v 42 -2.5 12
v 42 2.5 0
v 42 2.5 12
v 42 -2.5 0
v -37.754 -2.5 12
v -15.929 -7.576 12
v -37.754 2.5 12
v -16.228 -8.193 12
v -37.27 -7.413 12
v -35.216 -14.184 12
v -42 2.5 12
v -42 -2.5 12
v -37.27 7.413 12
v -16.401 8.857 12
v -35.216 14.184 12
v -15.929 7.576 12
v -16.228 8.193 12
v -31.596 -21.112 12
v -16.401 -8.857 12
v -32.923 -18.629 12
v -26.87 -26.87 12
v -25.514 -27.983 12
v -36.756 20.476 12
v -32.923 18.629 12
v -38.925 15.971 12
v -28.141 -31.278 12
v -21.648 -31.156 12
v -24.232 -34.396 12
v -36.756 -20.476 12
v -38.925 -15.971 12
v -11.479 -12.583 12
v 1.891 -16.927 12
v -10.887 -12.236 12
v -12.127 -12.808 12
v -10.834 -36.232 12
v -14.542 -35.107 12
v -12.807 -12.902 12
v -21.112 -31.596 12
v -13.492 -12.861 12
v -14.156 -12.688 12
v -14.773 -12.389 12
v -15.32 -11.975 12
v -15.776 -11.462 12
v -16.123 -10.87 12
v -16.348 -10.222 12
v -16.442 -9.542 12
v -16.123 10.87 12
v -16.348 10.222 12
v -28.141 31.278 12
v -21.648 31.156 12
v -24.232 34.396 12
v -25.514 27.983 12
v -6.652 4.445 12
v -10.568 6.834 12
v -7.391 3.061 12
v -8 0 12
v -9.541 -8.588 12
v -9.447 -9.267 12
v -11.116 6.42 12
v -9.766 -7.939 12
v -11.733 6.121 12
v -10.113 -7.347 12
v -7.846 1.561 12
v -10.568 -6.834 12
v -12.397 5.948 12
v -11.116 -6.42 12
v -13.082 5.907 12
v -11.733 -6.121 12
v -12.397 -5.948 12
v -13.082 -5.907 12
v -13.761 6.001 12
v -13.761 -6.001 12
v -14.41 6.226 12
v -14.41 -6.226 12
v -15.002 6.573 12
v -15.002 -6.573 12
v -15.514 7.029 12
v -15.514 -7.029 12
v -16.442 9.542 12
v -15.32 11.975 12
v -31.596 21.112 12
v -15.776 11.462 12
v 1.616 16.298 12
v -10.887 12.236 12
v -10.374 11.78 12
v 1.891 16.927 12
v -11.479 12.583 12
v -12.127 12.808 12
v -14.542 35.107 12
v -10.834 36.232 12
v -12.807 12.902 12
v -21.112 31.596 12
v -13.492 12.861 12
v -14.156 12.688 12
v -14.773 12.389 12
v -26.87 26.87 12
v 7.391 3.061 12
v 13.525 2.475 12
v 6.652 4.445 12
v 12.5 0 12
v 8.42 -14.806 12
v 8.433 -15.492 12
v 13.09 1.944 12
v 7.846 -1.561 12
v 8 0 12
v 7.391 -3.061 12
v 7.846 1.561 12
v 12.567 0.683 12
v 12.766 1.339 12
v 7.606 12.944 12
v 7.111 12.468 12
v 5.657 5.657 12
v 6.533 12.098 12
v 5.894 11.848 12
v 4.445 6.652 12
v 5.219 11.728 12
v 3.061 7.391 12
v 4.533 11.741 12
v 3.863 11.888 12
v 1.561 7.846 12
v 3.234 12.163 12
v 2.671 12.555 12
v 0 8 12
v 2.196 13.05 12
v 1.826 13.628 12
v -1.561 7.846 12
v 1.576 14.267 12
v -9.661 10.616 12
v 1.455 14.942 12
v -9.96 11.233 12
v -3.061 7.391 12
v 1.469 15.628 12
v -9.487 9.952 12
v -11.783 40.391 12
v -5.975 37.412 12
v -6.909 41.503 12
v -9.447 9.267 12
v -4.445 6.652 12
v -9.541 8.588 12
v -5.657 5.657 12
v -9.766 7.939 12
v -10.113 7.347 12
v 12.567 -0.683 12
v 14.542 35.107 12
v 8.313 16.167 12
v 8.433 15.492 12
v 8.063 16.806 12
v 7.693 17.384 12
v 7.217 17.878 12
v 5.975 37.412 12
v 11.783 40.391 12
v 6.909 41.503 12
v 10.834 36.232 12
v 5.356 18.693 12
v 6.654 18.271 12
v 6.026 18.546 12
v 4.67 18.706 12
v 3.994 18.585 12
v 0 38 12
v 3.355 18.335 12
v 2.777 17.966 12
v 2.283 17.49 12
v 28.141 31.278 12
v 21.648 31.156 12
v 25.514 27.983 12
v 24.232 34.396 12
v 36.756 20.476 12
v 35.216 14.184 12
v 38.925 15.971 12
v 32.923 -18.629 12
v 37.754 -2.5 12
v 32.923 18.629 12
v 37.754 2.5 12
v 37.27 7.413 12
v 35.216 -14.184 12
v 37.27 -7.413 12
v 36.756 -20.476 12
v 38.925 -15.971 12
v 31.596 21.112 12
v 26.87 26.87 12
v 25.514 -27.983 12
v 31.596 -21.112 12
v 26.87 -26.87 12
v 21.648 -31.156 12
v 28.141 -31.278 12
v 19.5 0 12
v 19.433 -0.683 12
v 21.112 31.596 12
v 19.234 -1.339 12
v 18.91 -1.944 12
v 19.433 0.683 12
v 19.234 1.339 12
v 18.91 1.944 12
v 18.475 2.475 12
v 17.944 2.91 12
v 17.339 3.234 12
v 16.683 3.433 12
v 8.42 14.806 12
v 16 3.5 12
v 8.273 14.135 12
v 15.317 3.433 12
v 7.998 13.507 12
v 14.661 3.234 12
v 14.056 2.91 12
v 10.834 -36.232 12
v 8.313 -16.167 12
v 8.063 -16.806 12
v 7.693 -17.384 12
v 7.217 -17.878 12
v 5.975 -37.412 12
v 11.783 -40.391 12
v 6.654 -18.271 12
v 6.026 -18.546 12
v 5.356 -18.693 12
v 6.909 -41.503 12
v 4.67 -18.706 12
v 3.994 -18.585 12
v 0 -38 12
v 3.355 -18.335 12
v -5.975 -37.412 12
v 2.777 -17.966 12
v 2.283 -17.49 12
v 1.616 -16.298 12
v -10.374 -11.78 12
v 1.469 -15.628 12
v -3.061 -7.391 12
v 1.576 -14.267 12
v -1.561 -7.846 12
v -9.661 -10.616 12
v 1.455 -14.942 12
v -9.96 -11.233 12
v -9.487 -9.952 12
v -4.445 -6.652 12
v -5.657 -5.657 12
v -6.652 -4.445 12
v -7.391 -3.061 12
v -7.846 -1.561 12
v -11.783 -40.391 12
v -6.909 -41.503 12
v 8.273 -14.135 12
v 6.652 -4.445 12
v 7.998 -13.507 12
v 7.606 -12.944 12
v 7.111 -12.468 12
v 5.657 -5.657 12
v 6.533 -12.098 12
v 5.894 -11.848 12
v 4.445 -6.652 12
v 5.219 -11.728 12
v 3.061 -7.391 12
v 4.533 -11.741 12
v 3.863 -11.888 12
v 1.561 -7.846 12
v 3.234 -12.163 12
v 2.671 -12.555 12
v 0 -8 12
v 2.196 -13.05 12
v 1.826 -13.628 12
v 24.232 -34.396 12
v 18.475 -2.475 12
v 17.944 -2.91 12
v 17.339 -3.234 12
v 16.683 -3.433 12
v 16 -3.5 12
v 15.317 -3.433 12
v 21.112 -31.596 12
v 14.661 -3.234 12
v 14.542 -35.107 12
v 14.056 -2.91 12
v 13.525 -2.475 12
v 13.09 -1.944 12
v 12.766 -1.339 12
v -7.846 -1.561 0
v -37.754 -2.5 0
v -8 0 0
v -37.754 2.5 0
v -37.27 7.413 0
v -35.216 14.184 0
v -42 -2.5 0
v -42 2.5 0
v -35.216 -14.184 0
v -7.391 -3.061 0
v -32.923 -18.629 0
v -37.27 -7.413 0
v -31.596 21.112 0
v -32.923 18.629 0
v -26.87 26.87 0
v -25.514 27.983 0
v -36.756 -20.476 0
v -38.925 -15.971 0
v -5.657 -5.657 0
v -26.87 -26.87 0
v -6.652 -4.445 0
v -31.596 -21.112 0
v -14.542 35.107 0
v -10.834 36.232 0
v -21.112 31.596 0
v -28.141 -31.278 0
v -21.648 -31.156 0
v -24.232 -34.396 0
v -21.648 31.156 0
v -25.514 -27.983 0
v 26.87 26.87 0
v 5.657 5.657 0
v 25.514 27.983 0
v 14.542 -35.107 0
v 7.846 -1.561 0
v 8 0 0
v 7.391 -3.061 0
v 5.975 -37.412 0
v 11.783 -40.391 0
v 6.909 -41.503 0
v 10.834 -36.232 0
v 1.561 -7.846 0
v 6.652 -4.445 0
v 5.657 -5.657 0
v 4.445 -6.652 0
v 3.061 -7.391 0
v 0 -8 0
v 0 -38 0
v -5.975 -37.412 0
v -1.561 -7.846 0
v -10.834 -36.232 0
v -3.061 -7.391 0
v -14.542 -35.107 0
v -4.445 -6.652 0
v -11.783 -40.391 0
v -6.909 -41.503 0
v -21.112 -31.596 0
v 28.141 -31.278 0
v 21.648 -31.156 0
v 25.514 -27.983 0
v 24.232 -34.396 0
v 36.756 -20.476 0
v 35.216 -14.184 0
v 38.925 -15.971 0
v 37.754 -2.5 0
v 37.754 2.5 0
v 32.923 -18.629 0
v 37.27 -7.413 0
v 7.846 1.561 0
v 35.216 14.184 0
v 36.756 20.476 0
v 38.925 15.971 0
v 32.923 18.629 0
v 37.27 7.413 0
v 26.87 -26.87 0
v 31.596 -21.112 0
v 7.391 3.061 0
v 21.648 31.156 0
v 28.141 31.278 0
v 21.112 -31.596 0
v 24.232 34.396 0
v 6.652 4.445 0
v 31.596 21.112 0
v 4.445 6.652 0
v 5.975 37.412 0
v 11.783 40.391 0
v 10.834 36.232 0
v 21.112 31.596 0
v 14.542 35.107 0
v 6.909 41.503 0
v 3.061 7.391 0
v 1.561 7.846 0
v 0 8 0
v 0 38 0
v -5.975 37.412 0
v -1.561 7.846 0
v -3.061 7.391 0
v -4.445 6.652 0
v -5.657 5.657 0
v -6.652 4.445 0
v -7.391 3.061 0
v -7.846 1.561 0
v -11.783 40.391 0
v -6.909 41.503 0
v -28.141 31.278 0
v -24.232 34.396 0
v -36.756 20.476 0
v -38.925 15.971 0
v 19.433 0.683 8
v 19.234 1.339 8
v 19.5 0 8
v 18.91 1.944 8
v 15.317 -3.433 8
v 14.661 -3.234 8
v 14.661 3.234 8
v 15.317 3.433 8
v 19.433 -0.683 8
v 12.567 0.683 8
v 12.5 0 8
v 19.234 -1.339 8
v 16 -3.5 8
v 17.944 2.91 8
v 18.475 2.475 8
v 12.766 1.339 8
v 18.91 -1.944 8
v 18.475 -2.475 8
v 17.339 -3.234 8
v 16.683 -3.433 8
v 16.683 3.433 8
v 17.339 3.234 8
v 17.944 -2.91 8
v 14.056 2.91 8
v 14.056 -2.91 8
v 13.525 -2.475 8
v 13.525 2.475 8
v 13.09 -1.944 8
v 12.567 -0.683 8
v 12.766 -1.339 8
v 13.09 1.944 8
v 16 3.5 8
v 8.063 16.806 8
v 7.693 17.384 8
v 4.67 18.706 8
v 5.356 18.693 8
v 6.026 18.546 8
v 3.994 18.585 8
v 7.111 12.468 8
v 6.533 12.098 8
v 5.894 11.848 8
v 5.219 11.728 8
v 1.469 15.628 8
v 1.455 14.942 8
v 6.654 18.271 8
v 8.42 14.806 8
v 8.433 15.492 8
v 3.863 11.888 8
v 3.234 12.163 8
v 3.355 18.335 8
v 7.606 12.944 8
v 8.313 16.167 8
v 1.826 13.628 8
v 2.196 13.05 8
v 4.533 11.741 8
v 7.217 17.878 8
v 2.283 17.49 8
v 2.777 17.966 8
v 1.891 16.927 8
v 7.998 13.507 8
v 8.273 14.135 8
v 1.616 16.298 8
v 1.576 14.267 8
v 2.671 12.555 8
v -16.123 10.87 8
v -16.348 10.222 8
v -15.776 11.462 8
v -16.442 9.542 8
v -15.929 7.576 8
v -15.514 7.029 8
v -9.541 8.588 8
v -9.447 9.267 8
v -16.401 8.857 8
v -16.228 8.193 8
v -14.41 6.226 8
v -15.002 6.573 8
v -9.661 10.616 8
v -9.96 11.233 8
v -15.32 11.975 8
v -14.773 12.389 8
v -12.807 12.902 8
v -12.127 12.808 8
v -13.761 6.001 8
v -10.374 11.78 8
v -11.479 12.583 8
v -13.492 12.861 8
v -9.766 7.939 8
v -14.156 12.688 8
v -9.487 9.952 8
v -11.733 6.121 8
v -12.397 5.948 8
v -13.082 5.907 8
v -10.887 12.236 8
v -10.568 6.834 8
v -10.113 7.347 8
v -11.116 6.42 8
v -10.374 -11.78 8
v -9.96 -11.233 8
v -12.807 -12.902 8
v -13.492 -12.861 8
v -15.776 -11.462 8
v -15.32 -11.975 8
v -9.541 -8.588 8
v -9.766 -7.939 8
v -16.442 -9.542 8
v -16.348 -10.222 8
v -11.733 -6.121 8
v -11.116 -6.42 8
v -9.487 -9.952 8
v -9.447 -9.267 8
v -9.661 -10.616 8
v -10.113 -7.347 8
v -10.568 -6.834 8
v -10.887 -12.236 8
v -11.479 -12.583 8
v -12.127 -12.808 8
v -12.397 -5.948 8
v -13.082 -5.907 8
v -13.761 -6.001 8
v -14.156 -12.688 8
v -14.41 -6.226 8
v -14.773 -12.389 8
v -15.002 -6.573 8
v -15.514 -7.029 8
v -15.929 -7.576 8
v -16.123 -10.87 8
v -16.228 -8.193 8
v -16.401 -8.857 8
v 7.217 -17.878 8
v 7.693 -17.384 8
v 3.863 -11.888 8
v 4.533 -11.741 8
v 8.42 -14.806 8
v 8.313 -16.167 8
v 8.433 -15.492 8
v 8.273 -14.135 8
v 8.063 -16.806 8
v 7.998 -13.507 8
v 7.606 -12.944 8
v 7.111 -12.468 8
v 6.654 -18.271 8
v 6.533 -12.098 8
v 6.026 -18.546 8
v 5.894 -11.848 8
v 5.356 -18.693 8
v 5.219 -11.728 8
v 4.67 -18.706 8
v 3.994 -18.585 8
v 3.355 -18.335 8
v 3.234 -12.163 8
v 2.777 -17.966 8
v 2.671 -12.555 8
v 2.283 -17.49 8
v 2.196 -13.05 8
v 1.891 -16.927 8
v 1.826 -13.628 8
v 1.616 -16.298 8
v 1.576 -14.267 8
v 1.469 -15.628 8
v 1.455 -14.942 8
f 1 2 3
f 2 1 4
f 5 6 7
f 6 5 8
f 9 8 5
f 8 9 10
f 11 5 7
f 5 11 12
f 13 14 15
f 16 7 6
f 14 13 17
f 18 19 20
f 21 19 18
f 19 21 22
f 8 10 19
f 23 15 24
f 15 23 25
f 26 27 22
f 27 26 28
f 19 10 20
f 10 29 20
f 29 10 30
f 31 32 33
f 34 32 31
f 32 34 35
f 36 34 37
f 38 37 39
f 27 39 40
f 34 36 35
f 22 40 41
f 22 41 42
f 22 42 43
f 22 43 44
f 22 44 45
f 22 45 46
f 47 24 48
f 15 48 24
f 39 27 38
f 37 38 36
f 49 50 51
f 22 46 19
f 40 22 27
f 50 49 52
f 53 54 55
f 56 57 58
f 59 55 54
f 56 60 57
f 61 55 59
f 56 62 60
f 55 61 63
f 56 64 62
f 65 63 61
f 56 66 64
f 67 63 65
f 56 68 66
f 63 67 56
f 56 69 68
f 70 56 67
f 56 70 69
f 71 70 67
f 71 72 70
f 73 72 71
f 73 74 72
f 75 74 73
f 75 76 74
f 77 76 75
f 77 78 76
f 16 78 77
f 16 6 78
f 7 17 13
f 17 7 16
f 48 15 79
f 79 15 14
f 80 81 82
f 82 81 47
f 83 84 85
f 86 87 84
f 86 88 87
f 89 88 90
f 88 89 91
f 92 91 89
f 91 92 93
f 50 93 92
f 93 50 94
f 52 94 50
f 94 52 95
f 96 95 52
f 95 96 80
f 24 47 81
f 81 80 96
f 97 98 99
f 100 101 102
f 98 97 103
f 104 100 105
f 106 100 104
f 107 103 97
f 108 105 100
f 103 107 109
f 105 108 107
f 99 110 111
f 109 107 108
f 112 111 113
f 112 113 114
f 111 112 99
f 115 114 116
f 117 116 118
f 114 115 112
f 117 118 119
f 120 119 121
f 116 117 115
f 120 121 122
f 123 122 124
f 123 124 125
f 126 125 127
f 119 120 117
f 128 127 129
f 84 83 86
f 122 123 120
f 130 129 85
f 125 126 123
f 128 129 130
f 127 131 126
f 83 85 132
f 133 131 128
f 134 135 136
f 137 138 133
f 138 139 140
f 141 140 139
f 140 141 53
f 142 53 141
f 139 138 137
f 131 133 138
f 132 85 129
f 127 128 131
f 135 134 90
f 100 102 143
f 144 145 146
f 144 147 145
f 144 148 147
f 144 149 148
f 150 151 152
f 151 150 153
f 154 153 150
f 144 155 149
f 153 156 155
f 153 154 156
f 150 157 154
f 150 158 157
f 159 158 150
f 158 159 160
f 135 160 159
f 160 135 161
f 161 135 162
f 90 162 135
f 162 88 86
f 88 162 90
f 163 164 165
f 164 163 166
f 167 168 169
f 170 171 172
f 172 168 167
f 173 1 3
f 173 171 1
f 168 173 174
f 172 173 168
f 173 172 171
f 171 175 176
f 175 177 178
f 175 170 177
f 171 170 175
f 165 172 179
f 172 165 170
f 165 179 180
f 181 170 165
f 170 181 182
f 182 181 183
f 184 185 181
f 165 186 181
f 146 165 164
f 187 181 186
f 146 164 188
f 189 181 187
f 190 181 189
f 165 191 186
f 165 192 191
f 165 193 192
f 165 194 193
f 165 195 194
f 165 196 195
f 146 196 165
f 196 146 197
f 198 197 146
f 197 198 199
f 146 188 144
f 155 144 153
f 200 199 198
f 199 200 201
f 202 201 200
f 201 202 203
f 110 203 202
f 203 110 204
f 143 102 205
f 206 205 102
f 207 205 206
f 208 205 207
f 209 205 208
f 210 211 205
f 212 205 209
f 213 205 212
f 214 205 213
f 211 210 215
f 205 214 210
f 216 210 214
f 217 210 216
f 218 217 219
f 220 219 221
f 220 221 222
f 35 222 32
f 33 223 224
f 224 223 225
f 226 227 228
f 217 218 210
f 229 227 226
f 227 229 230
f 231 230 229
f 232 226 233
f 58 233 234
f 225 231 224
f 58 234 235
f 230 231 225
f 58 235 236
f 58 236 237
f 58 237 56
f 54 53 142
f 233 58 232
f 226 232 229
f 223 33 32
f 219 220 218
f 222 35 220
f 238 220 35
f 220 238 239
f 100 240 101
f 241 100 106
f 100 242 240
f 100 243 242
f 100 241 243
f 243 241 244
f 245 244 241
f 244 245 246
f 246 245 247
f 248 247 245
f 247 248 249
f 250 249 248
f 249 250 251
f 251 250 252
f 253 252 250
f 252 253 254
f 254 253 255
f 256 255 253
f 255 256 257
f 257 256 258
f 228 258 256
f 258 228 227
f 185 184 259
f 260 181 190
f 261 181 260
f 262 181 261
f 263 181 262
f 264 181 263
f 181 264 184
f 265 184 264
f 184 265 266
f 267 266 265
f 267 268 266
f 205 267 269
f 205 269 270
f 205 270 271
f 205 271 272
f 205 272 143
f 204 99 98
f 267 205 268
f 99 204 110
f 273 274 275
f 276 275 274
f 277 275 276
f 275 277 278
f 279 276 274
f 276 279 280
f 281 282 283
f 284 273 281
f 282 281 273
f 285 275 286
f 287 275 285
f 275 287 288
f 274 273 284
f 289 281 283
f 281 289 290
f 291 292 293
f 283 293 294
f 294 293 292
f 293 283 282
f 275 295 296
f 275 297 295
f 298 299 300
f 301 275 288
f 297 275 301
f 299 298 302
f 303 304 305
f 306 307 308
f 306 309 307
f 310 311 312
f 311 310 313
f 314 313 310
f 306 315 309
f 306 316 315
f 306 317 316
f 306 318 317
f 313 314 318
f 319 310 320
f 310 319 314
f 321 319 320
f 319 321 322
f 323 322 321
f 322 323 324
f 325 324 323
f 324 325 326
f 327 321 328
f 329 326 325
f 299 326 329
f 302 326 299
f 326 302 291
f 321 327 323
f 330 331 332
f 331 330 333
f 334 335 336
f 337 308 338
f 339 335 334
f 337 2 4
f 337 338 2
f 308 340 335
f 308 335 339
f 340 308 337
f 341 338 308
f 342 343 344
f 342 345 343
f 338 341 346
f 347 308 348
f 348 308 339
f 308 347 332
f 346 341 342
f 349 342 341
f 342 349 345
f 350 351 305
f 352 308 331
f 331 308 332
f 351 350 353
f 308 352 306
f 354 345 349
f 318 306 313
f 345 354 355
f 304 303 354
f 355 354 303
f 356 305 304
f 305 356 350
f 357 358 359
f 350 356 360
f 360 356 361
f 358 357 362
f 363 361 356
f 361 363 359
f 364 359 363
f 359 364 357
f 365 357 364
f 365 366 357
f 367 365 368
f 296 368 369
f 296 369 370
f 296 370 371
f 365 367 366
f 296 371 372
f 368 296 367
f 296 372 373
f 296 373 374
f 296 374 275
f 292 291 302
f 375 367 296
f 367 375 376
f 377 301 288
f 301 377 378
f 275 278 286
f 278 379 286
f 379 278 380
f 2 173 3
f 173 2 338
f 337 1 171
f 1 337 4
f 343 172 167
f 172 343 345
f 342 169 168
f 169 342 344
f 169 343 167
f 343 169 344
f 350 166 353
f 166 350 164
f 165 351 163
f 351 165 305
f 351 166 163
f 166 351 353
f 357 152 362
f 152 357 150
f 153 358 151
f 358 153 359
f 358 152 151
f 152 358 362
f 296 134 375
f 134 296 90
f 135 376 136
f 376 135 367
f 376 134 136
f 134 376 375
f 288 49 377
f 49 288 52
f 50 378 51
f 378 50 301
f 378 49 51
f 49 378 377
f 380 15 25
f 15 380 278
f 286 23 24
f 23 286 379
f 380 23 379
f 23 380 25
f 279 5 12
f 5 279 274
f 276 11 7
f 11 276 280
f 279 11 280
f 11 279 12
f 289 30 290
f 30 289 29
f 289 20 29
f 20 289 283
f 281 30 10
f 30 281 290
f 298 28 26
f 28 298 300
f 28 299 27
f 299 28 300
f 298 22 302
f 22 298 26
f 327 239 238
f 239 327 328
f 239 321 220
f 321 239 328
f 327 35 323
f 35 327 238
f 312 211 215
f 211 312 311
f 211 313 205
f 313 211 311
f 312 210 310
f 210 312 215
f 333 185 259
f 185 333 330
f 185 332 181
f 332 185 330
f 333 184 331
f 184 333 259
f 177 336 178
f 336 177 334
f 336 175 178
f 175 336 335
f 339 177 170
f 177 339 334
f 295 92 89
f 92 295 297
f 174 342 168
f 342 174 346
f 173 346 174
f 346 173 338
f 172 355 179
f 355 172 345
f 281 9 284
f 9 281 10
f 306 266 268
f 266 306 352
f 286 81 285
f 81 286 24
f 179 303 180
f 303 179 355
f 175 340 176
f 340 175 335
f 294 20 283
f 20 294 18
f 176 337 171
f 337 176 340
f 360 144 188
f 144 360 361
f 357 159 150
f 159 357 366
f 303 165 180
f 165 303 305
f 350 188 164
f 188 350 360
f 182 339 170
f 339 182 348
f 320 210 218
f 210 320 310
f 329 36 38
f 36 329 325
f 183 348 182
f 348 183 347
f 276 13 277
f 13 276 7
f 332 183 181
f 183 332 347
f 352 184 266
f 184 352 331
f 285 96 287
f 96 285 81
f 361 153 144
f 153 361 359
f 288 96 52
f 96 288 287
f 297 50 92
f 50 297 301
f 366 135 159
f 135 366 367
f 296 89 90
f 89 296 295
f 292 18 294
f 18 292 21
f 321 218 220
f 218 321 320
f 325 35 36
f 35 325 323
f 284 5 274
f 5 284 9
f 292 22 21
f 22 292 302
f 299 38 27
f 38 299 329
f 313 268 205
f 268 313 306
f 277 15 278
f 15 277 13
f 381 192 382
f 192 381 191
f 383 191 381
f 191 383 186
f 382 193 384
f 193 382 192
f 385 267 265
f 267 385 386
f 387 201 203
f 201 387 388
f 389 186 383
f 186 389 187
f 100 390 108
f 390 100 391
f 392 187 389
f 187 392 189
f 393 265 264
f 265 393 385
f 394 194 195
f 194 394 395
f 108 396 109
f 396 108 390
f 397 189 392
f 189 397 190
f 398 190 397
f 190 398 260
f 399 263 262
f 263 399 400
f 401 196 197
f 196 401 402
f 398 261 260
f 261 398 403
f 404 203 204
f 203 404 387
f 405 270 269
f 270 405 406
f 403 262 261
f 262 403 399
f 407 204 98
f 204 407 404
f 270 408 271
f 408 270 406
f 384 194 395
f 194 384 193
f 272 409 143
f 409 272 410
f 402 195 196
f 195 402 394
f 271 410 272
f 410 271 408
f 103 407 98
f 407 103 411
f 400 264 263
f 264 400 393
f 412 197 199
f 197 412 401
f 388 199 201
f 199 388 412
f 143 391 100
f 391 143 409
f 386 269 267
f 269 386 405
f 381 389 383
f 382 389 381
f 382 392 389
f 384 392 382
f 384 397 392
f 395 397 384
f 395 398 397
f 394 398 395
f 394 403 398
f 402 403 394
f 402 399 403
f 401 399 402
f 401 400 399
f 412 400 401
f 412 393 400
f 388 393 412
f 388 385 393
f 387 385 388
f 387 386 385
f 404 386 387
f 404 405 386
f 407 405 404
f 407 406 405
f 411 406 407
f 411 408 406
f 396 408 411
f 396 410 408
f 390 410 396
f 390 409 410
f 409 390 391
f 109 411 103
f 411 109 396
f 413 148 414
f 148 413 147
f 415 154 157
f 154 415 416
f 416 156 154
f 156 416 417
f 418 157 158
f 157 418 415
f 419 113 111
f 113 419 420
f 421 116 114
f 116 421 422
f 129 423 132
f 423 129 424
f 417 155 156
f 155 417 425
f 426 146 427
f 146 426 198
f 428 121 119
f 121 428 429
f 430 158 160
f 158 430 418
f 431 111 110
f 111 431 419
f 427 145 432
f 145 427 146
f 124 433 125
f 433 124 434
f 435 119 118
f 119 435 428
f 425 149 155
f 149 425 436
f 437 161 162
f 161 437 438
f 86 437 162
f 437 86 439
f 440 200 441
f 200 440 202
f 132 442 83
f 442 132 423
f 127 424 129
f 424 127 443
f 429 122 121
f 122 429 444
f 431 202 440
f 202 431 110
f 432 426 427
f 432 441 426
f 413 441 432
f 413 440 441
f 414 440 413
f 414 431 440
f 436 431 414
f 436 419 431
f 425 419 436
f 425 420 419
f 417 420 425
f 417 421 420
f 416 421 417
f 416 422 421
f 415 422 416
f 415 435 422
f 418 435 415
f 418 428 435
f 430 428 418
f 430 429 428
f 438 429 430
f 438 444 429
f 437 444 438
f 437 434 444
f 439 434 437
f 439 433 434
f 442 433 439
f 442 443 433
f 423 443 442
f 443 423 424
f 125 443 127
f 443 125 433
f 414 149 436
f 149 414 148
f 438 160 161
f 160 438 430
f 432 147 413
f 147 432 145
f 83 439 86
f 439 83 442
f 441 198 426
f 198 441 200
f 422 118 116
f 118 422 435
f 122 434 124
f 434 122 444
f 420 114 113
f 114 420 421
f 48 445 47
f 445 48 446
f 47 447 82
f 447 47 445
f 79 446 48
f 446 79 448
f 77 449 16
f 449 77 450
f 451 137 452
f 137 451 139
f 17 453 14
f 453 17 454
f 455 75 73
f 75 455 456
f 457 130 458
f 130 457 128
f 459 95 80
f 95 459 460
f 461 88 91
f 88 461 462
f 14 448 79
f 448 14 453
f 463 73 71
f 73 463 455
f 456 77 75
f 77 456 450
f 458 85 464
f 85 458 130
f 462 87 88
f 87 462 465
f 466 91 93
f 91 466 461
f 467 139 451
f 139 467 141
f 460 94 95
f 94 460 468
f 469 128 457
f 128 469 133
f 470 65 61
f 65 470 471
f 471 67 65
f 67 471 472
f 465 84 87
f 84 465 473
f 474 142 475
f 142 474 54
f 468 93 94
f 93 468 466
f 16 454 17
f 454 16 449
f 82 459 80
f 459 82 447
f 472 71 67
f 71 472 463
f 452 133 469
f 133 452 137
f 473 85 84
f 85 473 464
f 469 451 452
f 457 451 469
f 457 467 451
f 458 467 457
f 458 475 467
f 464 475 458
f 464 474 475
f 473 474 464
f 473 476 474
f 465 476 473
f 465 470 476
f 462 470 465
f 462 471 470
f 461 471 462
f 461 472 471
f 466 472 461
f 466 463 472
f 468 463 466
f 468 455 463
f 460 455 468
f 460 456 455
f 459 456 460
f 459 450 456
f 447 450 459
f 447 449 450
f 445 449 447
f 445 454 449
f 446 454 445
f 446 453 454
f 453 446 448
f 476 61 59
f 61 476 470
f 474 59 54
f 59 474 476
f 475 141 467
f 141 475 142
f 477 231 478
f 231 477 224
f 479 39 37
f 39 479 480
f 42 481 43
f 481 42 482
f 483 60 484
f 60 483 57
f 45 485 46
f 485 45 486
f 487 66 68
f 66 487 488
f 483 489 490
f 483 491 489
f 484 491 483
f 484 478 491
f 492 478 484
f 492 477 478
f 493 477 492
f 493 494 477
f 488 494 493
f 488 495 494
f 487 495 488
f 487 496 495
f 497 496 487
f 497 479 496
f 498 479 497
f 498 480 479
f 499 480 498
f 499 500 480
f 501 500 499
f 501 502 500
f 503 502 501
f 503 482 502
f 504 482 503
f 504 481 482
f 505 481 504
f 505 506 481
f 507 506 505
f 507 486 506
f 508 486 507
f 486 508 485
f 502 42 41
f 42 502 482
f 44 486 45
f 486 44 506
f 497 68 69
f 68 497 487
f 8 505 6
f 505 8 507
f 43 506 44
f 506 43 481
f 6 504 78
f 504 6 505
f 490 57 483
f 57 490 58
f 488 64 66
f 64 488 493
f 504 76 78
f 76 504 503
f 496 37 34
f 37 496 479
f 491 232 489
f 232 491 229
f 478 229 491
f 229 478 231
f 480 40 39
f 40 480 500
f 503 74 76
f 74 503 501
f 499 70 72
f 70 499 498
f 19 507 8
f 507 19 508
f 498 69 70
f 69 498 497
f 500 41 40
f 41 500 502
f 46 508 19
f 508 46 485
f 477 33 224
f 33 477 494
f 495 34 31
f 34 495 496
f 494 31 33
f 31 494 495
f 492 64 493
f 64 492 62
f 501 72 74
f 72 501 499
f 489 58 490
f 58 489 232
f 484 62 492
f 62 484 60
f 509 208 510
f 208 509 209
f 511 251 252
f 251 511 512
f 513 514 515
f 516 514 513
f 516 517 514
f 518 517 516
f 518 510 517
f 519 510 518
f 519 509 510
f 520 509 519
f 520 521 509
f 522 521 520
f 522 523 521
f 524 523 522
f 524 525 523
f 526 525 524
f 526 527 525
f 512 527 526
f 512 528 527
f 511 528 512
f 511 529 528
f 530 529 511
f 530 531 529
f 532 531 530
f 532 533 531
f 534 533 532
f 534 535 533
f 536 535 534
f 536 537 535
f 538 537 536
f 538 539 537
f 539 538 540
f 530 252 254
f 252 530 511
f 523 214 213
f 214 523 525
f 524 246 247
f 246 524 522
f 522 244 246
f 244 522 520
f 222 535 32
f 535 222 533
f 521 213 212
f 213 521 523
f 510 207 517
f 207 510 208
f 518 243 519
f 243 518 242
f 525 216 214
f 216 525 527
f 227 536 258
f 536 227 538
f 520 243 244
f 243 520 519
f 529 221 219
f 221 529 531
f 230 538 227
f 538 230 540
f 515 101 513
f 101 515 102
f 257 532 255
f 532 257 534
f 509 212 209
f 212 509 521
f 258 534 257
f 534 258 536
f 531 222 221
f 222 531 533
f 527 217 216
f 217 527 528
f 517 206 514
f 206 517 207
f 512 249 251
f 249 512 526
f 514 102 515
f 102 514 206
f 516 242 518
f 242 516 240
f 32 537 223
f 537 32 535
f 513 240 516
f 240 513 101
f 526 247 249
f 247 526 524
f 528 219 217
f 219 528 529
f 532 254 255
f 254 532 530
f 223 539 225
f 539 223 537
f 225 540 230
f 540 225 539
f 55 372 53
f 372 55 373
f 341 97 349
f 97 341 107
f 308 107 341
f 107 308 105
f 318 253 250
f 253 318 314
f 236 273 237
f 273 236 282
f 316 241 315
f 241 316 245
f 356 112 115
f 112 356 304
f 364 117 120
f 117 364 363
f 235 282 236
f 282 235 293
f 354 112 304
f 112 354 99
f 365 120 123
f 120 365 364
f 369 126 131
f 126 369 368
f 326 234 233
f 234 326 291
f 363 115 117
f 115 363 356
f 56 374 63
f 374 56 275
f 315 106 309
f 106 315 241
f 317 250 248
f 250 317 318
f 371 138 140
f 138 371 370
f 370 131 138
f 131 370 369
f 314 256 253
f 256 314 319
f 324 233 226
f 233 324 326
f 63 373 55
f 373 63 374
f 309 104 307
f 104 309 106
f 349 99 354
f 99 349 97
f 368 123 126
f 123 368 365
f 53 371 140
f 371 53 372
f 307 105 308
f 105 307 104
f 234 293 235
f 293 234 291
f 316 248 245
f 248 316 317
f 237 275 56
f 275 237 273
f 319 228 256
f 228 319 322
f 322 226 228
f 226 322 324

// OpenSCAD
$fn = 32;

// ----------------------------------------------------------------------
// Spur blank: lightened gear blank
// ----------------------------------------------------------------------

// --- parameters (mm) ---
disc_r = 38;              // blank root radius
disc_t = 12;              // blank thickness
n_teeth = 14;             // stub tooth count
tooth_w = 5;              // tooth width at the root
tooth_h = 4;              // tooth height above the root
bore_r = 8;               // central bore radius
ring_r = 16;              // lightening pocket ring radius
pocket_r = 3.5;           // lightening pocket radius

out_r = disc_r + tooth_h;  // tip radius
bbox_x = 84.0;  // measured width over the teeth
bbox_y = 83.01;  // measured depth over the teeth

difference() {
union() {
  cylinder(r = disc_r, h = disc_t);
  for (i = [0 : n_teeth - 1])
    rotate([0, 0, i * 360 / n_teeth])
      translate([disc_r - 1, -tooth_w / 2, 0])
        cube([tooth_h + 1, tooth_w, disc_t]);
}
  translate([0, 0, -1]) cylinder(r = bore_r, h = disc_t + 2);
  for (i = [0 : 5])
    rotate([0, 0, i * 72])
      translate([ring_r, 0, disc_t - 4])
        cylinder(r = pocket_r, h = 5);
}
